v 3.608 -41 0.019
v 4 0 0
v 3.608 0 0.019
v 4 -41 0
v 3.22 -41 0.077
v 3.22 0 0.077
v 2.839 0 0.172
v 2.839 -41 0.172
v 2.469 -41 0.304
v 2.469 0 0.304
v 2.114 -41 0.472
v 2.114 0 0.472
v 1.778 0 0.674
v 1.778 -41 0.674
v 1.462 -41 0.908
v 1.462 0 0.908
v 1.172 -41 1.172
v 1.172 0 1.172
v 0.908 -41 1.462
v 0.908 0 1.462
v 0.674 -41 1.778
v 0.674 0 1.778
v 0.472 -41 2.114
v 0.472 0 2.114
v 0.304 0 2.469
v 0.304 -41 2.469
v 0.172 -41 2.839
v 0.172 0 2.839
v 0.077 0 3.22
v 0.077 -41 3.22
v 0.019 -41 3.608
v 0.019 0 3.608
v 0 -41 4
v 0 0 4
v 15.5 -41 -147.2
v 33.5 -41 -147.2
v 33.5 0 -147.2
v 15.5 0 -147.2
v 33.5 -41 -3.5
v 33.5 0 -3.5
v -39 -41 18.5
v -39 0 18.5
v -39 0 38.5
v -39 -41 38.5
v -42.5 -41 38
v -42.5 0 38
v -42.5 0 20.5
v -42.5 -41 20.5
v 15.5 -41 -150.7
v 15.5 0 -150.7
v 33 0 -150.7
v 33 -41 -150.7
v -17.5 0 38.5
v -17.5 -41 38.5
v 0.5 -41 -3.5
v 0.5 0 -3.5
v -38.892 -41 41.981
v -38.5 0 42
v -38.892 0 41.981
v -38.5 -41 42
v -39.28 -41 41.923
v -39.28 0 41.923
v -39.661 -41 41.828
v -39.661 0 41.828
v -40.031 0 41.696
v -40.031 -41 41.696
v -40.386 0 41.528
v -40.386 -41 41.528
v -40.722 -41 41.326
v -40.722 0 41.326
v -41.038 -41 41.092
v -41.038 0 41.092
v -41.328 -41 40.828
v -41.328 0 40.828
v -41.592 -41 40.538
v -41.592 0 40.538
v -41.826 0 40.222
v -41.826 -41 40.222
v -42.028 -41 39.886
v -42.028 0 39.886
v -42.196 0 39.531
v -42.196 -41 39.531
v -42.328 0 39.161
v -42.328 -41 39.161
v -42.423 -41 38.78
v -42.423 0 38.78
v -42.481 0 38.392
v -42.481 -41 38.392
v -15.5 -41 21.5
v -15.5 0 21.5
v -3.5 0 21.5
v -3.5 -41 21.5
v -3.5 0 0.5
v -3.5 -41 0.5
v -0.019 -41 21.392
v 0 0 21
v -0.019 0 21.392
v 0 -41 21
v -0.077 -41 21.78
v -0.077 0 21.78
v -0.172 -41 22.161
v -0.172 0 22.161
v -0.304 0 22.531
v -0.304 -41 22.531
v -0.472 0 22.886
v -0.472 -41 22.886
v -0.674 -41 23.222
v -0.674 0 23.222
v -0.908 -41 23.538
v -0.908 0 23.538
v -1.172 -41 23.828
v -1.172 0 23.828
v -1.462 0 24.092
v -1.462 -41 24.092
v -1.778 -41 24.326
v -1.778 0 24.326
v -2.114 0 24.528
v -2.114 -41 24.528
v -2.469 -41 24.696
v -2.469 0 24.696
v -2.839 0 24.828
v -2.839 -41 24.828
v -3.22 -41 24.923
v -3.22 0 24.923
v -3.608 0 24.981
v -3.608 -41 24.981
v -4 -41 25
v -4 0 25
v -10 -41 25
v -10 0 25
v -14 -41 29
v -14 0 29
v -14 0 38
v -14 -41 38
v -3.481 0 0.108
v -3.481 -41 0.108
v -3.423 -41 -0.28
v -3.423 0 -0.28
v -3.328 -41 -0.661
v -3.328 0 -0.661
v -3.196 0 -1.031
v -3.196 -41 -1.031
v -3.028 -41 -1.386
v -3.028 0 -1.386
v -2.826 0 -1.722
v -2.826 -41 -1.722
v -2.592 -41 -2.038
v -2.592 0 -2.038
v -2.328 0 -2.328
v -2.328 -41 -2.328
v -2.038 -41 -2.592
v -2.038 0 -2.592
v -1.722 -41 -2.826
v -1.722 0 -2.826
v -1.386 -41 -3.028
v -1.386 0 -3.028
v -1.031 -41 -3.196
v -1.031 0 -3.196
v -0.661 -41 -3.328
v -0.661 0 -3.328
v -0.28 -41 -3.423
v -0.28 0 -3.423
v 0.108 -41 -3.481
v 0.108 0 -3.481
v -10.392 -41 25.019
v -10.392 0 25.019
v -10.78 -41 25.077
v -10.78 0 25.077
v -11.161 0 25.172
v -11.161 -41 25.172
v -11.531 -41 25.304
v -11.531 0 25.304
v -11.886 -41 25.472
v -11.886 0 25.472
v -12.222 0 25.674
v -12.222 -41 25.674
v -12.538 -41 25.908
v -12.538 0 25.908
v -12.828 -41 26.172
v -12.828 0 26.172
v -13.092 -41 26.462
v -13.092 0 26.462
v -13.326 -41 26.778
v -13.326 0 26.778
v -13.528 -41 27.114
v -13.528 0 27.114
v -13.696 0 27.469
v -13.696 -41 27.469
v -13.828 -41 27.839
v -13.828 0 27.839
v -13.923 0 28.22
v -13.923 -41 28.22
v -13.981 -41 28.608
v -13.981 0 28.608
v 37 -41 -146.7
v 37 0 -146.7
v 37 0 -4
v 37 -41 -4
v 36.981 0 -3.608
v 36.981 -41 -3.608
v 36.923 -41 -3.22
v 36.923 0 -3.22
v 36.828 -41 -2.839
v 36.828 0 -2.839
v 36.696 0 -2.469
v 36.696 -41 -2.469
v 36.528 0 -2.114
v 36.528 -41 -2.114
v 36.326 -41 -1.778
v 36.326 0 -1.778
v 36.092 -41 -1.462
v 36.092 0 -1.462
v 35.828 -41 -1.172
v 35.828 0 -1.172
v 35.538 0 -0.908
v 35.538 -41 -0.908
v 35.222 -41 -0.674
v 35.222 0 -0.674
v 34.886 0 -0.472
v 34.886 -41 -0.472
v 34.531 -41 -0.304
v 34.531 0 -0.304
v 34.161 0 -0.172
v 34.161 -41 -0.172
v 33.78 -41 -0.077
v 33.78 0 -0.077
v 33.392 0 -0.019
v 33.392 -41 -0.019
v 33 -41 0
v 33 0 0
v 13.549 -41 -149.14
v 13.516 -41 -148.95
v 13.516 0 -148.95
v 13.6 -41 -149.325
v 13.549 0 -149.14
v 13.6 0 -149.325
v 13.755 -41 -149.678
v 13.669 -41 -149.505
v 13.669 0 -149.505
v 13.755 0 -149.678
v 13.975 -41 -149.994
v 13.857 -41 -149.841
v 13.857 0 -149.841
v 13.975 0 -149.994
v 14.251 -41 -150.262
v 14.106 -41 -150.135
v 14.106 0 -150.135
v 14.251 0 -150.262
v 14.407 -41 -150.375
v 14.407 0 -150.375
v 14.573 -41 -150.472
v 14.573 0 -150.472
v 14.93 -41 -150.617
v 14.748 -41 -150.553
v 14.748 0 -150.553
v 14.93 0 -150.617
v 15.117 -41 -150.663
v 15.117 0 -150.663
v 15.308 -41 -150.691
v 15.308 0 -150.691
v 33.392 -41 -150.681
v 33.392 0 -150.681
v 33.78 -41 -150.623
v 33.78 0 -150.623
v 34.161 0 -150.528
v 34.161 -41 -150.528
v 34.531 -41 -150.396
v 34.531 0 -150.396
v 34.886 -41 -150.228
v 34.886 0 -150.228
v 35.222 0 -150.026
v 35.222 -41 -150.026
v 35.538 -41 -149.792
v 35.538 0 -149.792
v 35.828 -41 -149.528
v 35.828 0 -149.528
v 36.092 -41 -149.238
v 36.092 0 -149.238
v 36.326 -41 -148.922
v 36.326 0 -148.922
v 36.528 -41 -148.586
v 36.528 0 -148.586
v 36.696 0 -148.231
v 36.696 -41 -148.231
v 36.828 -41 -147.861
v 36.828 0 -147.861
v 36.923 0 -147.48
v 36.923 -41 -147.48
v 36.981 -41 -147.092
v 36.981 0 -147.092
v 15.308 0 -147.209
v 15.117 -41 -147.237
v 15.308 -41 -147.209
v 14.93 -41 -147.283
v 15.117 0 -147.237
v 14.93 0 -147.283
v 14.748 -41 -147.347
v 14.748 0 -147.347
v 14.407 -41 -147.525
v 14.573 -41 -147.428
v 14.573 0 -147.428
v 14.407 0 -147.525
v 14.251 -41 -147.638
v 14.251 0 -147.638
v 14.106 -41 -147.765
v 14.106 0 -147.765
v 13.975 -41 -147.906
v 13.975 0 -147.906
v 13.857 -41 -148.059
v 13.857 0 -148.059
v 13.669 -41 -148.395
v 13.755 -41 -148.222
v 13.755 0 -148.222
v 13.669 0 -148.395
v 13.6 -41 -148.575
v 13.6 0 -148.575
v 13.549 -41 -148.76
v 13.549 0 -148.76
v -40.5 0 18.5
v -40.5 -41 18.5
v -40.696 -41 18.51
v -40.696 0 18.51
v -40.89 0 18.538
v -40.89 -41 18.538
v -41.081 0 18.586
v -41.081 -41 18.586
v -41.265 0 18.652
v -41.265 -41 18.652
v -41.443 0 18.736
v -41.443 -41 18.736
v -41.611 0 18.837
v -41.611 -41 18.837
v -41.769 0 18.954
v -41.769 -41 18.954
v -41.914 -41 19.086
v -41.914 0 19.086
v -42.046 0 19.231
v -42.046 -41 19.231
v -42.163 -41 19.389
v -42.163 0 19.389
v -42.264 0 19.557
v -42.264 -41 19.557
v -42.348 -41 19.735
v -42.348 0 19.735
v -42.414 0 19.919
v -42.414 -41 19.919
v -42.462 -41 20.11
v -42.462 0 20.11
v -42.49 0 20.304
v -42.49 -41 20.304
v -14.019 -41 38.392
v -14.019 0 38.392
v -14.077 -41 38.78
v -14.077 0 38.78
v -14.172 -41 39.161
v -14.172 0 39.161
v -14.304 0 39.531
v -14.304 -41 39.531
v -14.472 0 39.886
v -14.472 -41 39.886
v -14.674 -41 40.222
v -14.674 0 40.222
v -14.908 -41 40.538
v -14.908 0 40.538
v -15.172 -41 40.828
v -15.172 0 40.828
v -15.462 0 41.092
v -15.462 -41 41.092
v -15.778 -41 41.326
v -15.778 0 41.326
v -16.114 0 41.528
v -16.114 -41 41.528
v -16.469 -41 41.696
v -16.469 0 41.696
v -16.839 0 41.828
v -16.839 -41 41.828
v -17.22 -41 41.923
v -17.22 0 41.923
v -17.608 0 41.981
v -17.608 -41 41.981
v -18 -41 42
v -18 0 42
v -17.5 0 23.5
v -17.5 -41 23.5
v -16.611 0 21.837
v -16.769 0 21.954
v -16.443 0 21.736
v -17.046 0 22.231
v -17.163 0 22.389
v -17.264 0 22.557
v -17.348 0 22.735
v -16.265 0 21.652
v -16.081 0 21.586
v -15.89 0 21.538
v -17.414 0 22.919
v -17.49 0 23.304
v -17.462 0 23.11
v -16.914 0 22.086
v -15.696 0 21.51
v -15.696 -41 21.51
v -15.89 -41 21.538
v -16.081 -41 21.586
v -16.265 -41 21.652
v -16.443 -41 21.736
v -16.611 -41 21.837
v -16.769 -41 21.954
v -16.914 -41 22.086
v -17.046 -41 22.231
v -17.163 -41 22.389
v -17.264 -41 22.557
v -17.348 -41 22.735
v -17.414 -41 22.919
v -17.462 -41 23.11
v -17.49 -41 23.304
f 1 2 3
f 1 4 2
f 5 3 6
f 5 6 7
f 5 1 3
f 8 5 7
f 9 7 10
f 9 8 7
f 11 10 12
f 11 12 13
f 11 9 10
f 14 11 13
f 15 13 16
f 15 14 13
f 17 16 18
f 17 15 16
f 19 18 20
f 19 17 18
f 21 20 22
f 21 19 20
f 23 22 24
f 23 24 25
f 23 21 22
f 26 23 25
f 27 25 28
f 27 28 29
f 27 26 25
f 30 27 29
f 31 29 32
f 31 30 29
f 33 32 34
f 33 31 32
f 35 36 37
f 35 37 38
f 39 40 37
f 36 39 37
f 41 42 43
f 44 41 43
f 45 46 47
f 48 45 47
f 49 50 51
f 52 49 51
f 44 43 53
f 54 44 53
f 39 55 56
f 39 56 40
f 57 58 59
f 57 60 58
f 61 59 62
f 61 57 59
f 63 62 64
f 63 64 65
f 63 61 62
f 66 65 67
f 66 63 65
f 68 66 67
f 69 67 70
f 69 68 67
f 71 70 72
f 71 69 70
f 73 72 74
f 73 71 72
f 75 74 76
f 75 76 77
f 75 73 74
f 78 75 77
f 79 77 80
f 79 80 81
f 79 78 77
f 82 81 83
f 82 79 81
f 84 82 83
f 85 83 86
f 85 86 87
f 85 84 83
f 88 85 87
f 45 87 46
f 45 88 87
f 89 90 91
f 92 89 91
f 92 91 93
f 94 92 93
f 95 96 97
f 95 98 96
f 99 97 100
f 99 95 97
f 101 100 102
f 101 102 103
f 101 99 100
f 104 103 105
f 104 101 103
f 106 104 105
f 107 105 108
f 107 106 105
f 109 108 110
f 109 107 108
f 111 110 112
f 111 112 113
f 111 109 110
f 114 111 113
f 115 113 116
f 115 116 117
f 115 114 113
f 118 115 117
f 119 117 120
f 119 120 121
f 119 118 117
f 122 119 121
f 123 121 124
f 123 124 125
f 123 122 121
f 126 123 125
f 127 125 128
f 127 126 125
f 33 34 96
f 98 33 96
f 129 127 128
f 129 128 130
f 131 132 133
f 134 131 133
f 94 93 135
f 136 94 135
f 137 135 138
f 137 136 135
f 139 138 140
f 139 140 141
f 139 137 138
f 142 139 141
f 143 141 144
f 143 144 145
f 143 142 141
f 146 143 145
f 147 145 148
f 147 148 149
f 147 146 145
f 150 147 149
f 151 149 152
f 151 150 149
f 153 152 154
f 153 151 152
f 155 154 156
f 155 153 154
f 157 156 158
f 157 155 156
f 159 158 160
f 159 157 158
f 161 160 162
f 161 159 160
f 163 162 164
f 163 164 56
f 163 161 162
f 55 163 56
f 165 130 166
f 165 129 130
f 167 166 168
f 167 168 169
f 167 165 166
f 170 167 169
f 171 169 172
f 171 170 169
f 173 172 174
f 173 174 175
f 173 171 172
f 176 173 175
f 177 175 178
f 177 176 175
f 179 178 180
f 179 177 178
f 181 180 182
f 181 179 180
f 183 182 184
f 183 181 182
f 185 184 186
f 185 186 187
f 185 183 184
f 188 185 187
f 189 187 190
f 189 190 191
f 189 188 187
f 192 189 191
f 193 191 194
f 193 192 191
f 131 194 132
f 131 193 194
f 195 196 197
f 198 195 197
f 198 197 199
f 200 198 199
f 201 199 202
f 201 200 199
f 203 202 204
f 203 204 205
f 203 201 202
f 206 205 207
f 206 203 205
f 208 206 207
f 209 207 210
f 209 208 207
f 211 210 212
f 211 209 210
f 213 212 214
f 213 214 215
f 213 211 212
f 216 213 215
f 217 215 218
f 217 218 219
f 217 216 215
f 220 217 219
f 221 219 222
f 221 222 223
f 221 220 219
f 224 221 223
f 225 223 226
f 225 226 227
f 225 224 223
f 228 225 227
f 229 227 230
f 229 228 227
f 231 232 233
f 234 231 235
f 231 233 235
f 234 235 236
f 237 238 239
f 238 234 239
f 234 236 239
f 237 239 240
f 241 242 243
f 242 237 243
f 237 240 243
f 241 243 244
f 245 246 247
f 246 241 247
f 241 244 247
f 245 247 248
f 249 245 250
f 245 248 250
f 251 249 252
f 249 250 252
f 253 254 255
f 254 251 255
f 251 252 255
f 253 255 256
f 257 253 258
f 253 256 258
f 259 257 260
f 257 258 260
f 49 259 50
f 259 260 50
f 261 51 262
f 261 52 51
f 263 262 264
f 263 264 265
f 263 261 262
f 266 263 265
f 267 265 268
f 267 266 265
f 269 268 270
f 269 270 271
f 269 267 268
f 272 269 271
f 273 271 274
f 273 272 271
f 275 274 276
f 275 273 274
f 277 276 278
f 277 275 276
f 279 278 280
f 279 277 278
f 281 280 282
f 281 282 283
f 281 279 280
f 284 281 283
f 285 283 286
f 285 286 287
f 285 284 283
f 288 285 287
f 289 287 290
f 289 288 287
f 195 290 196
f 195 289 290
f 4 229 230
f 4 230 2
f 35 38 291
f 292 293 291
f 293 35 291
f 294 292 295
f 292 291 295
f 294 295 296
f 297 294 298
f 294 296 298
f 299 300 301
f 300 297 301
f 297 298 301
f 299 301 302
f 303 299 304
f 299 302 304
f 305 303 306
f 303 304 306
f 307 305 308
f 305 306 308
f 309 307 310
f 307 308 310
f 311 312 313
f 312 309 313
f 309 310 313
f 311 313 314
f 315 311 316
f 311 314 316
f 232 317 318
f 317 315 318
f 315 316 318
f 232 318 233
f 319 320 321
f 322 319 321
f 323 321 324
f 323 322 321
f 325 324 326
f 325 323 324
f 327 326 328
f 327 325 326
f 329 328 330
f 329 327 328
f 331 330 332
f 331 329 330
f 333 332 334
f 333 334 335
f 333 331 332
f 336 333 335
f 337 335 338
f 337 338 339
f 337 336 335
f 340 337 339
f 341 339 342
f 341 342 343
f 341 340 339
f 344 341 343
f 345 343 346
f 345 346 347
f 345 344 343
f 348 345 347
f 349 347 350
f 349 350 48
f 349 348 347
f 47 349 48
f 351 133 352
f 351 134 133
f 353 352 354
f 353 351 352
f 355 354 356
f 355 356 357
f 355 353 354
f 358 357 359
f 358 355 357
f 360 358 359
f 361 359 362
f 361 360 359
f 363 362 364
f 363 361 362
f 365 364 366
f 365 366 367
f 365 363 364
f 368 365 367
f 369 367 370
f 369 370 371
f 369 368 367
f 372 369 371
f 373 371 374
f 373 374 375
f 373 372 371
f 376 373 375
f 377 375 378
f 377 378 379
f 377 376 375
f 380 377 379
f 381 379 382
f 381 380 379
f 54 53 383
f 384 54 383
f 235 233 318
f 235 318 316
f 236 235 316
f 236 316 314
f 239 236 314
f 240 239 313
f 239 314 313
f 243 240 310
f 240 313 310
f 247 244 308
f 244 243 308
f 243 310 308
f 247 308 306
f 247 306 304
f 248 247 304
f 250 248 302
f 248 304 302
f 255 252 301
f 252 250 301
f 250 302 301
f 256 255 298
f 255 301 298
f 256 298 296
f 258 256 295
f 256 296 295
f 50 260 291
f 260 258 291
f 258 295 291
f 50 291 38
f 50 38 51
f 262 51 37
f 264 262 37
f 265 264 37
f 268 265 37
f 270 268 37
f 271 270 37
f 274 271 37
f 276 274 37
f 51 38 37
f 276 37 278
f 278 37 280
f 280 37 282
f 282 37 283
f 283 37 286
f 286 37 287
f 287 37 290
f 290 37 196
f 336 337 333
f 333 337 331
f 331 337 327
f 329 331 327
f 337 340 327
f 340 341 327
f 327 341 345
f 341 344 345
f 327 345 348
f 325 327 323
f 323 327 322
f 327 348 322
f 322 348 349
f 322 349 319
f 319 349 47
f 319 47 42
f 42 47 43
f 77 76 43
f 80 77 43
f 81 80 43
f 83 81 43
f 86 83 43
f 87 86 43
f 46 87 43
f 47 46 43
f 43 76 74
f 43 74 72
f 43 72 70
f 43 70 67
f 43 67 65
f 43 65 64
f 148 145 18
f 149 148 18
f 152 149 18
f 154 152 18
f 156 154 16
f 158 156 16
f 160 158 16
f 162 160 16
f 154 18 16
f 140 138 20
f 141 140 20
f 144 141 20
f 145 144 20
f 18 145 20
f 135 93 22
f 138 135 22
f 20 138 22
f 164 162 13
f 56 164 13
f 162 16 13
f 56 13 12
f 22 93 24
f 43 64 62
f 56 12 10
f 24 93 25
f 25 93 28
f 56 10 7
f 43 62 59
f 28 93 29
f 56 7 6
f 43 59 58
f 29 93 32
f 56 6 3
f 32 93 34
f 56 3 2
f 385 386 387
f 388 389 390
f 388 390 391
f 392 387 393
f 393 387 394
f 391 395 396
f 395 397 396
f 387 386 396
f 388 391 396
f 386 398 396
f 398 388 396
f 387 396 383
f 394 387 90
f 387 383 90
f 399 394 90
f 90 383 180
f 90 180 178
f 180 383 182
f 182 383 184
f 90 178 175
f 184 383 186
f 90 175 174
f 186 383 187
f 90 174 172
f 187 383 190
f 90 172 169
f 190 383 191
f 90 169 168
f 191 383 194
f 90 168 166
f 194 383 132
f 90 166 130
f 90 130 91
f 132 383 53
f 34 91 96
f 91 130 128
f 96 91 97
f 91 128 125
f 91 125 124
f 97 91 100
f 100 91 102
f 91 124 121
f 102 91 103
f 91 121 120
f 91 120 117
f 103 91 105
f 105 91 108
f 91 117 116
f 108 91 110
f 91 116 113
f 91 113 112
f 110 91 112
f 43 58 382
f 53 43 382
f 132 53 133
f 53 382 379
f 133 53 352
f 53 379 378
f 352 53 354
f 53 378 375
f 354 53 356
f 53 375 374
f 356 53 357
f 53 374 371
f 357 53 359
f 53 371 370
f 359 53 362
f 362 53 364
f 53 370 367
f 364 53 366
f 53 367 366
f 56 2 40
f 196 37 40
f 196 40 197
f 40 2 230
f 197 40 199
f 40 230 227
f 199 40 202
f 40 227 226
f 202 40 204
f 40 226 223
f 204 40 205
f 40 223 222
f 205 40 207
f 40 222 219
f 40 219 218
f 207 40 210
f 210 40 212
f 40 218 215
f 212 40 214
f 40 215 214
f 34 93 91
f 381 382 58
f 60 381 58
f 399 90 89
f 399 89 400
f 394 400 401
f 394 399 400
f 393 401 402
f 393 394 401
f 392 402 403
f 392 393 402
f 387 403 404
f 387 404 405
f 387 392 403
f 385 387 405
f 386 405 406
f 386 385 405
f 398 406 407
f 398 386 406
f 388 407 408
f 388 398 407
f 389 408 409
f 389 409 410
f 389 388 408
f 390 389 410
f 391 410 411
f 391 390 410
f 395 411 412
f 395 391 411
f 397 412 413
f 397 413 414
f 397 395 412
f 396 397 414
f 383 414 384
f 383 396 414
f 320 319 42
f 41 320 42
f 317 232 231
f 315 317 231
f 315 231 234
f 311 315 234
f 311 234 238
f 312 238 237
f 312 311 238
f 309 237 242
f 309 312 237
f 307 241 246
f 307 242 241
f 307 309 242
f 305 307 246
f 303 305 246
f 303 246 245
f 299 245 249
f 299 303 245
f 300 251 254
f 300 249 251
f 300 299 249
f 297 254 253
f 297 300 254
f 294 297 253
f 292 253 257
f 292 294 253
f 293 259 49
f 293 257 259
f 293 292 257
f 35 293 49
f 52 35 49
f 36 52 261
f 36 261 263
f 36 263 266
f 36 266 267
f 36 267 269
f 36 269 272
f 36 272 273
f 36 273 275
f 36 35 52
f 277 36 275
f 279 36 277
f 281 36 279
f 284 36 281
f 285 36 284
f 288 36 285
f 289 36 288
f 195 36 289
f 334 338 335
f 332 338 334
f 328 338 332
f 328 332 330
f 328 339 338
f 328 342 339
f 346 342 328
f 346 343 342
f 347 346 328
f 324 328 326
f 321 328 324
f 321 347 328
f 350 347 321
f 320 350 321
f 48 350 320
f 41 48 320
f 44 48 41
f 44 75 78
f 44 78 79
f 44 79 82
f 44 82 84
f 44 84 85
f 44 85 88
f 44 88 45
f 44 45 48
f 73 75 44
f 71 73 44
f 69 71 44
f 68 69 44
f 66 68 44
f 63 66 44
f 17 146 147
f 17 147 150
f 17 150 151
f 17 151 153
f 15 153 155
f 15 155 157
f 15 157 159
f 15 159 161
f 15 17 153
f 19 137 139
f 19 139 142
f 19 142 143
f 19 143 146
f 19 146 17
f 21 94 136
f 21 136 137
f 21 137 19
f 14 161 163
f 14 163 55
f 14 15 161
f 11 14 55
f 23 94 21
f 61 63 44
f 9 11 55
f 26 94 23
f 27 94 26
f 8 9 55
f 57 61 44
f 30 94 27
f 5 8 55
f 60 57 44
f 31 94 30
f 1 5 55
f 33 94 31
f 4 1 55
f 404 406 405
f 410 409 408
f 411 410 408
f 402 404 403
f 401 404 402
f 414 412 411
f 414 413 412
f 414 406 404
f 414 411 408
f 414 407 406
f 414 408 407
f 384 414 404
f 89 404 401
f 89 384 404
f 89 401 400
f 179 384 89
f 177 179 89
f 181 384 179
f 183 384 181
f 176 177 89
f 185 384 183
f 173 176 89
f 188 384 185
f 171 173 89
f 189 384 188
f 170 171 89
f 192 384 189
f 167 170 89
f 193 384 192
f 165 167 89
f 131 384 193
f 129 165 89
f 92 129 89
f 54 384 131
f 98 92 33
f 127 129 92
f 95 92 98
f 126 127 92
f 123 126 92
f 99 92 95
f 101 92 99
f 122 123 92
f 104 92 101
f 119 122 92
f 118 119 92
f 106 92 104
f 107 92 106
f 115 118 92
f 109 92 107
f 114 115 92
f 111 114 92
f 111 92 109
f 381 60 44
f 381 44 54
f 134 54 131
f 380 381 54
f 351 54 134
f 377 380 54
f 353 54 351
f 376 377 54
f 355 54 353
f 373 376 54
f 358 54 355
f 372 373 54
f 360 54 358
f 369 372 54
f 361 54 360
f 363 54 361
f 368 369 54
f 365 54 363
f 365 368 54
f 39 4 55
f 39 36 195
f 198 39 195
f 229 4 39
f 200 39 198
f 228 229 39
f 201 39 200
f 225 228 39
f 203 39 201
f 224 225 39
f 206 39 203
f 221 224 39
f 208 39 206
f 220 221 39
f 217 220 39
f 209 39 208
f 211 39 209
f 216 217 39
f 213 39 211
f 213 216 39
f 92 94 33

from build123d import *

# Parameters (mm, degrees)
F1_DEPTH    = 41
F2_R        = 4
F3_T1_DEPTH = 51


# Not quite as in the source:
# - a fillet or chamfer that OpenCascade refuses, or shapes differently, is made with other operations: its cross-section is extruded or revolved along the edge and cut away or added


with BuildPart() as f1:
    # F0 (on Front) → F1 (new body)
    with BuildSketch(Plane.XZ):
        Polygon((-42.5, 18.5), (-39, 18.5), (-39, 38.5), (-17.5, 38.5), (-17.5, 21.5), (-3.5, 21.5), (-3.5, -3.5), (0, -3.5), (0, 0), (0, 25), (-14, 25), (-14, 42), (-42.5, 42), align=None)
        Polygon((0, 0), (0, -3.5), (33.5, -3.5), (33.5, -147.2), (13.5, -147.2), (13.5, -150.7), (37, -150.7), (37, 0), align=None)
    extrude(amount=F1_DEPTH)

    # F2
    f2_edges = [f1.edges().sort_by_distance(p)[0] for p in [
        (-42.5, -20.5, 42),
        (-14, -20.5, 42),
        (0, -20.5, 25),
        (0, -20.5, 0),
        (-14, -20.5, 25),
        (37, -20.5, 0),
        (37, -20.5, -150.7),
        (-3.5, -20.5, -3.5),
    ]]
    fillet(f2_edges, radius=F2_R)

    # F3: fillet of radius 2 on 4 edges, made by hand

    # F3_s2 → F3_t1 (cut)
    with BuildSketch(Plane.XZ.offset(-5)):
        with BuildLine():
            ThreePointArc((-40.5, 18.5), (-41.9142135624, 19.0857864376), (-42.5, 20.5))
            Line((-42.5, 20.5), (-42.5, 18.5))
            Line((-42.5, 18.5), (-40.5, 18.5))
        make_face()
        with BuildLine():
            ThreePointArc((15.5, -147.2), (14.0857864376, -147.7857864376), (13.5, -149.2))
            Line((13.5, -149.2), (13.5, -147.2))
            Line((13.5, -147.2), (15.5, -147.2))
        make_face()
        with BuildLine():
            ThreePointArc((13.5, -148.7), (14.0857864376, -150.1142135624), (15.5, -150.7))
            Line((15.5, -150.7), (13.5, -150.7))
            Line((13.5, -150.7), (13.5, -148.7))
        make_face()
        with BuildLine():
            ThreePointArc((-15.5, 21.5), (-16.9142135624, 22.0857864376), (-17.5, 23.5))
            Line((-17.5, 23.5), (-17.5, 21.5))
            Line((-17.5, 21.5), (-15.5, 21.5))
        make_face()
    extrude(amount=F3_T1_DEPTH, mode=Mode.SUBTRACT)


solid = f1.part
